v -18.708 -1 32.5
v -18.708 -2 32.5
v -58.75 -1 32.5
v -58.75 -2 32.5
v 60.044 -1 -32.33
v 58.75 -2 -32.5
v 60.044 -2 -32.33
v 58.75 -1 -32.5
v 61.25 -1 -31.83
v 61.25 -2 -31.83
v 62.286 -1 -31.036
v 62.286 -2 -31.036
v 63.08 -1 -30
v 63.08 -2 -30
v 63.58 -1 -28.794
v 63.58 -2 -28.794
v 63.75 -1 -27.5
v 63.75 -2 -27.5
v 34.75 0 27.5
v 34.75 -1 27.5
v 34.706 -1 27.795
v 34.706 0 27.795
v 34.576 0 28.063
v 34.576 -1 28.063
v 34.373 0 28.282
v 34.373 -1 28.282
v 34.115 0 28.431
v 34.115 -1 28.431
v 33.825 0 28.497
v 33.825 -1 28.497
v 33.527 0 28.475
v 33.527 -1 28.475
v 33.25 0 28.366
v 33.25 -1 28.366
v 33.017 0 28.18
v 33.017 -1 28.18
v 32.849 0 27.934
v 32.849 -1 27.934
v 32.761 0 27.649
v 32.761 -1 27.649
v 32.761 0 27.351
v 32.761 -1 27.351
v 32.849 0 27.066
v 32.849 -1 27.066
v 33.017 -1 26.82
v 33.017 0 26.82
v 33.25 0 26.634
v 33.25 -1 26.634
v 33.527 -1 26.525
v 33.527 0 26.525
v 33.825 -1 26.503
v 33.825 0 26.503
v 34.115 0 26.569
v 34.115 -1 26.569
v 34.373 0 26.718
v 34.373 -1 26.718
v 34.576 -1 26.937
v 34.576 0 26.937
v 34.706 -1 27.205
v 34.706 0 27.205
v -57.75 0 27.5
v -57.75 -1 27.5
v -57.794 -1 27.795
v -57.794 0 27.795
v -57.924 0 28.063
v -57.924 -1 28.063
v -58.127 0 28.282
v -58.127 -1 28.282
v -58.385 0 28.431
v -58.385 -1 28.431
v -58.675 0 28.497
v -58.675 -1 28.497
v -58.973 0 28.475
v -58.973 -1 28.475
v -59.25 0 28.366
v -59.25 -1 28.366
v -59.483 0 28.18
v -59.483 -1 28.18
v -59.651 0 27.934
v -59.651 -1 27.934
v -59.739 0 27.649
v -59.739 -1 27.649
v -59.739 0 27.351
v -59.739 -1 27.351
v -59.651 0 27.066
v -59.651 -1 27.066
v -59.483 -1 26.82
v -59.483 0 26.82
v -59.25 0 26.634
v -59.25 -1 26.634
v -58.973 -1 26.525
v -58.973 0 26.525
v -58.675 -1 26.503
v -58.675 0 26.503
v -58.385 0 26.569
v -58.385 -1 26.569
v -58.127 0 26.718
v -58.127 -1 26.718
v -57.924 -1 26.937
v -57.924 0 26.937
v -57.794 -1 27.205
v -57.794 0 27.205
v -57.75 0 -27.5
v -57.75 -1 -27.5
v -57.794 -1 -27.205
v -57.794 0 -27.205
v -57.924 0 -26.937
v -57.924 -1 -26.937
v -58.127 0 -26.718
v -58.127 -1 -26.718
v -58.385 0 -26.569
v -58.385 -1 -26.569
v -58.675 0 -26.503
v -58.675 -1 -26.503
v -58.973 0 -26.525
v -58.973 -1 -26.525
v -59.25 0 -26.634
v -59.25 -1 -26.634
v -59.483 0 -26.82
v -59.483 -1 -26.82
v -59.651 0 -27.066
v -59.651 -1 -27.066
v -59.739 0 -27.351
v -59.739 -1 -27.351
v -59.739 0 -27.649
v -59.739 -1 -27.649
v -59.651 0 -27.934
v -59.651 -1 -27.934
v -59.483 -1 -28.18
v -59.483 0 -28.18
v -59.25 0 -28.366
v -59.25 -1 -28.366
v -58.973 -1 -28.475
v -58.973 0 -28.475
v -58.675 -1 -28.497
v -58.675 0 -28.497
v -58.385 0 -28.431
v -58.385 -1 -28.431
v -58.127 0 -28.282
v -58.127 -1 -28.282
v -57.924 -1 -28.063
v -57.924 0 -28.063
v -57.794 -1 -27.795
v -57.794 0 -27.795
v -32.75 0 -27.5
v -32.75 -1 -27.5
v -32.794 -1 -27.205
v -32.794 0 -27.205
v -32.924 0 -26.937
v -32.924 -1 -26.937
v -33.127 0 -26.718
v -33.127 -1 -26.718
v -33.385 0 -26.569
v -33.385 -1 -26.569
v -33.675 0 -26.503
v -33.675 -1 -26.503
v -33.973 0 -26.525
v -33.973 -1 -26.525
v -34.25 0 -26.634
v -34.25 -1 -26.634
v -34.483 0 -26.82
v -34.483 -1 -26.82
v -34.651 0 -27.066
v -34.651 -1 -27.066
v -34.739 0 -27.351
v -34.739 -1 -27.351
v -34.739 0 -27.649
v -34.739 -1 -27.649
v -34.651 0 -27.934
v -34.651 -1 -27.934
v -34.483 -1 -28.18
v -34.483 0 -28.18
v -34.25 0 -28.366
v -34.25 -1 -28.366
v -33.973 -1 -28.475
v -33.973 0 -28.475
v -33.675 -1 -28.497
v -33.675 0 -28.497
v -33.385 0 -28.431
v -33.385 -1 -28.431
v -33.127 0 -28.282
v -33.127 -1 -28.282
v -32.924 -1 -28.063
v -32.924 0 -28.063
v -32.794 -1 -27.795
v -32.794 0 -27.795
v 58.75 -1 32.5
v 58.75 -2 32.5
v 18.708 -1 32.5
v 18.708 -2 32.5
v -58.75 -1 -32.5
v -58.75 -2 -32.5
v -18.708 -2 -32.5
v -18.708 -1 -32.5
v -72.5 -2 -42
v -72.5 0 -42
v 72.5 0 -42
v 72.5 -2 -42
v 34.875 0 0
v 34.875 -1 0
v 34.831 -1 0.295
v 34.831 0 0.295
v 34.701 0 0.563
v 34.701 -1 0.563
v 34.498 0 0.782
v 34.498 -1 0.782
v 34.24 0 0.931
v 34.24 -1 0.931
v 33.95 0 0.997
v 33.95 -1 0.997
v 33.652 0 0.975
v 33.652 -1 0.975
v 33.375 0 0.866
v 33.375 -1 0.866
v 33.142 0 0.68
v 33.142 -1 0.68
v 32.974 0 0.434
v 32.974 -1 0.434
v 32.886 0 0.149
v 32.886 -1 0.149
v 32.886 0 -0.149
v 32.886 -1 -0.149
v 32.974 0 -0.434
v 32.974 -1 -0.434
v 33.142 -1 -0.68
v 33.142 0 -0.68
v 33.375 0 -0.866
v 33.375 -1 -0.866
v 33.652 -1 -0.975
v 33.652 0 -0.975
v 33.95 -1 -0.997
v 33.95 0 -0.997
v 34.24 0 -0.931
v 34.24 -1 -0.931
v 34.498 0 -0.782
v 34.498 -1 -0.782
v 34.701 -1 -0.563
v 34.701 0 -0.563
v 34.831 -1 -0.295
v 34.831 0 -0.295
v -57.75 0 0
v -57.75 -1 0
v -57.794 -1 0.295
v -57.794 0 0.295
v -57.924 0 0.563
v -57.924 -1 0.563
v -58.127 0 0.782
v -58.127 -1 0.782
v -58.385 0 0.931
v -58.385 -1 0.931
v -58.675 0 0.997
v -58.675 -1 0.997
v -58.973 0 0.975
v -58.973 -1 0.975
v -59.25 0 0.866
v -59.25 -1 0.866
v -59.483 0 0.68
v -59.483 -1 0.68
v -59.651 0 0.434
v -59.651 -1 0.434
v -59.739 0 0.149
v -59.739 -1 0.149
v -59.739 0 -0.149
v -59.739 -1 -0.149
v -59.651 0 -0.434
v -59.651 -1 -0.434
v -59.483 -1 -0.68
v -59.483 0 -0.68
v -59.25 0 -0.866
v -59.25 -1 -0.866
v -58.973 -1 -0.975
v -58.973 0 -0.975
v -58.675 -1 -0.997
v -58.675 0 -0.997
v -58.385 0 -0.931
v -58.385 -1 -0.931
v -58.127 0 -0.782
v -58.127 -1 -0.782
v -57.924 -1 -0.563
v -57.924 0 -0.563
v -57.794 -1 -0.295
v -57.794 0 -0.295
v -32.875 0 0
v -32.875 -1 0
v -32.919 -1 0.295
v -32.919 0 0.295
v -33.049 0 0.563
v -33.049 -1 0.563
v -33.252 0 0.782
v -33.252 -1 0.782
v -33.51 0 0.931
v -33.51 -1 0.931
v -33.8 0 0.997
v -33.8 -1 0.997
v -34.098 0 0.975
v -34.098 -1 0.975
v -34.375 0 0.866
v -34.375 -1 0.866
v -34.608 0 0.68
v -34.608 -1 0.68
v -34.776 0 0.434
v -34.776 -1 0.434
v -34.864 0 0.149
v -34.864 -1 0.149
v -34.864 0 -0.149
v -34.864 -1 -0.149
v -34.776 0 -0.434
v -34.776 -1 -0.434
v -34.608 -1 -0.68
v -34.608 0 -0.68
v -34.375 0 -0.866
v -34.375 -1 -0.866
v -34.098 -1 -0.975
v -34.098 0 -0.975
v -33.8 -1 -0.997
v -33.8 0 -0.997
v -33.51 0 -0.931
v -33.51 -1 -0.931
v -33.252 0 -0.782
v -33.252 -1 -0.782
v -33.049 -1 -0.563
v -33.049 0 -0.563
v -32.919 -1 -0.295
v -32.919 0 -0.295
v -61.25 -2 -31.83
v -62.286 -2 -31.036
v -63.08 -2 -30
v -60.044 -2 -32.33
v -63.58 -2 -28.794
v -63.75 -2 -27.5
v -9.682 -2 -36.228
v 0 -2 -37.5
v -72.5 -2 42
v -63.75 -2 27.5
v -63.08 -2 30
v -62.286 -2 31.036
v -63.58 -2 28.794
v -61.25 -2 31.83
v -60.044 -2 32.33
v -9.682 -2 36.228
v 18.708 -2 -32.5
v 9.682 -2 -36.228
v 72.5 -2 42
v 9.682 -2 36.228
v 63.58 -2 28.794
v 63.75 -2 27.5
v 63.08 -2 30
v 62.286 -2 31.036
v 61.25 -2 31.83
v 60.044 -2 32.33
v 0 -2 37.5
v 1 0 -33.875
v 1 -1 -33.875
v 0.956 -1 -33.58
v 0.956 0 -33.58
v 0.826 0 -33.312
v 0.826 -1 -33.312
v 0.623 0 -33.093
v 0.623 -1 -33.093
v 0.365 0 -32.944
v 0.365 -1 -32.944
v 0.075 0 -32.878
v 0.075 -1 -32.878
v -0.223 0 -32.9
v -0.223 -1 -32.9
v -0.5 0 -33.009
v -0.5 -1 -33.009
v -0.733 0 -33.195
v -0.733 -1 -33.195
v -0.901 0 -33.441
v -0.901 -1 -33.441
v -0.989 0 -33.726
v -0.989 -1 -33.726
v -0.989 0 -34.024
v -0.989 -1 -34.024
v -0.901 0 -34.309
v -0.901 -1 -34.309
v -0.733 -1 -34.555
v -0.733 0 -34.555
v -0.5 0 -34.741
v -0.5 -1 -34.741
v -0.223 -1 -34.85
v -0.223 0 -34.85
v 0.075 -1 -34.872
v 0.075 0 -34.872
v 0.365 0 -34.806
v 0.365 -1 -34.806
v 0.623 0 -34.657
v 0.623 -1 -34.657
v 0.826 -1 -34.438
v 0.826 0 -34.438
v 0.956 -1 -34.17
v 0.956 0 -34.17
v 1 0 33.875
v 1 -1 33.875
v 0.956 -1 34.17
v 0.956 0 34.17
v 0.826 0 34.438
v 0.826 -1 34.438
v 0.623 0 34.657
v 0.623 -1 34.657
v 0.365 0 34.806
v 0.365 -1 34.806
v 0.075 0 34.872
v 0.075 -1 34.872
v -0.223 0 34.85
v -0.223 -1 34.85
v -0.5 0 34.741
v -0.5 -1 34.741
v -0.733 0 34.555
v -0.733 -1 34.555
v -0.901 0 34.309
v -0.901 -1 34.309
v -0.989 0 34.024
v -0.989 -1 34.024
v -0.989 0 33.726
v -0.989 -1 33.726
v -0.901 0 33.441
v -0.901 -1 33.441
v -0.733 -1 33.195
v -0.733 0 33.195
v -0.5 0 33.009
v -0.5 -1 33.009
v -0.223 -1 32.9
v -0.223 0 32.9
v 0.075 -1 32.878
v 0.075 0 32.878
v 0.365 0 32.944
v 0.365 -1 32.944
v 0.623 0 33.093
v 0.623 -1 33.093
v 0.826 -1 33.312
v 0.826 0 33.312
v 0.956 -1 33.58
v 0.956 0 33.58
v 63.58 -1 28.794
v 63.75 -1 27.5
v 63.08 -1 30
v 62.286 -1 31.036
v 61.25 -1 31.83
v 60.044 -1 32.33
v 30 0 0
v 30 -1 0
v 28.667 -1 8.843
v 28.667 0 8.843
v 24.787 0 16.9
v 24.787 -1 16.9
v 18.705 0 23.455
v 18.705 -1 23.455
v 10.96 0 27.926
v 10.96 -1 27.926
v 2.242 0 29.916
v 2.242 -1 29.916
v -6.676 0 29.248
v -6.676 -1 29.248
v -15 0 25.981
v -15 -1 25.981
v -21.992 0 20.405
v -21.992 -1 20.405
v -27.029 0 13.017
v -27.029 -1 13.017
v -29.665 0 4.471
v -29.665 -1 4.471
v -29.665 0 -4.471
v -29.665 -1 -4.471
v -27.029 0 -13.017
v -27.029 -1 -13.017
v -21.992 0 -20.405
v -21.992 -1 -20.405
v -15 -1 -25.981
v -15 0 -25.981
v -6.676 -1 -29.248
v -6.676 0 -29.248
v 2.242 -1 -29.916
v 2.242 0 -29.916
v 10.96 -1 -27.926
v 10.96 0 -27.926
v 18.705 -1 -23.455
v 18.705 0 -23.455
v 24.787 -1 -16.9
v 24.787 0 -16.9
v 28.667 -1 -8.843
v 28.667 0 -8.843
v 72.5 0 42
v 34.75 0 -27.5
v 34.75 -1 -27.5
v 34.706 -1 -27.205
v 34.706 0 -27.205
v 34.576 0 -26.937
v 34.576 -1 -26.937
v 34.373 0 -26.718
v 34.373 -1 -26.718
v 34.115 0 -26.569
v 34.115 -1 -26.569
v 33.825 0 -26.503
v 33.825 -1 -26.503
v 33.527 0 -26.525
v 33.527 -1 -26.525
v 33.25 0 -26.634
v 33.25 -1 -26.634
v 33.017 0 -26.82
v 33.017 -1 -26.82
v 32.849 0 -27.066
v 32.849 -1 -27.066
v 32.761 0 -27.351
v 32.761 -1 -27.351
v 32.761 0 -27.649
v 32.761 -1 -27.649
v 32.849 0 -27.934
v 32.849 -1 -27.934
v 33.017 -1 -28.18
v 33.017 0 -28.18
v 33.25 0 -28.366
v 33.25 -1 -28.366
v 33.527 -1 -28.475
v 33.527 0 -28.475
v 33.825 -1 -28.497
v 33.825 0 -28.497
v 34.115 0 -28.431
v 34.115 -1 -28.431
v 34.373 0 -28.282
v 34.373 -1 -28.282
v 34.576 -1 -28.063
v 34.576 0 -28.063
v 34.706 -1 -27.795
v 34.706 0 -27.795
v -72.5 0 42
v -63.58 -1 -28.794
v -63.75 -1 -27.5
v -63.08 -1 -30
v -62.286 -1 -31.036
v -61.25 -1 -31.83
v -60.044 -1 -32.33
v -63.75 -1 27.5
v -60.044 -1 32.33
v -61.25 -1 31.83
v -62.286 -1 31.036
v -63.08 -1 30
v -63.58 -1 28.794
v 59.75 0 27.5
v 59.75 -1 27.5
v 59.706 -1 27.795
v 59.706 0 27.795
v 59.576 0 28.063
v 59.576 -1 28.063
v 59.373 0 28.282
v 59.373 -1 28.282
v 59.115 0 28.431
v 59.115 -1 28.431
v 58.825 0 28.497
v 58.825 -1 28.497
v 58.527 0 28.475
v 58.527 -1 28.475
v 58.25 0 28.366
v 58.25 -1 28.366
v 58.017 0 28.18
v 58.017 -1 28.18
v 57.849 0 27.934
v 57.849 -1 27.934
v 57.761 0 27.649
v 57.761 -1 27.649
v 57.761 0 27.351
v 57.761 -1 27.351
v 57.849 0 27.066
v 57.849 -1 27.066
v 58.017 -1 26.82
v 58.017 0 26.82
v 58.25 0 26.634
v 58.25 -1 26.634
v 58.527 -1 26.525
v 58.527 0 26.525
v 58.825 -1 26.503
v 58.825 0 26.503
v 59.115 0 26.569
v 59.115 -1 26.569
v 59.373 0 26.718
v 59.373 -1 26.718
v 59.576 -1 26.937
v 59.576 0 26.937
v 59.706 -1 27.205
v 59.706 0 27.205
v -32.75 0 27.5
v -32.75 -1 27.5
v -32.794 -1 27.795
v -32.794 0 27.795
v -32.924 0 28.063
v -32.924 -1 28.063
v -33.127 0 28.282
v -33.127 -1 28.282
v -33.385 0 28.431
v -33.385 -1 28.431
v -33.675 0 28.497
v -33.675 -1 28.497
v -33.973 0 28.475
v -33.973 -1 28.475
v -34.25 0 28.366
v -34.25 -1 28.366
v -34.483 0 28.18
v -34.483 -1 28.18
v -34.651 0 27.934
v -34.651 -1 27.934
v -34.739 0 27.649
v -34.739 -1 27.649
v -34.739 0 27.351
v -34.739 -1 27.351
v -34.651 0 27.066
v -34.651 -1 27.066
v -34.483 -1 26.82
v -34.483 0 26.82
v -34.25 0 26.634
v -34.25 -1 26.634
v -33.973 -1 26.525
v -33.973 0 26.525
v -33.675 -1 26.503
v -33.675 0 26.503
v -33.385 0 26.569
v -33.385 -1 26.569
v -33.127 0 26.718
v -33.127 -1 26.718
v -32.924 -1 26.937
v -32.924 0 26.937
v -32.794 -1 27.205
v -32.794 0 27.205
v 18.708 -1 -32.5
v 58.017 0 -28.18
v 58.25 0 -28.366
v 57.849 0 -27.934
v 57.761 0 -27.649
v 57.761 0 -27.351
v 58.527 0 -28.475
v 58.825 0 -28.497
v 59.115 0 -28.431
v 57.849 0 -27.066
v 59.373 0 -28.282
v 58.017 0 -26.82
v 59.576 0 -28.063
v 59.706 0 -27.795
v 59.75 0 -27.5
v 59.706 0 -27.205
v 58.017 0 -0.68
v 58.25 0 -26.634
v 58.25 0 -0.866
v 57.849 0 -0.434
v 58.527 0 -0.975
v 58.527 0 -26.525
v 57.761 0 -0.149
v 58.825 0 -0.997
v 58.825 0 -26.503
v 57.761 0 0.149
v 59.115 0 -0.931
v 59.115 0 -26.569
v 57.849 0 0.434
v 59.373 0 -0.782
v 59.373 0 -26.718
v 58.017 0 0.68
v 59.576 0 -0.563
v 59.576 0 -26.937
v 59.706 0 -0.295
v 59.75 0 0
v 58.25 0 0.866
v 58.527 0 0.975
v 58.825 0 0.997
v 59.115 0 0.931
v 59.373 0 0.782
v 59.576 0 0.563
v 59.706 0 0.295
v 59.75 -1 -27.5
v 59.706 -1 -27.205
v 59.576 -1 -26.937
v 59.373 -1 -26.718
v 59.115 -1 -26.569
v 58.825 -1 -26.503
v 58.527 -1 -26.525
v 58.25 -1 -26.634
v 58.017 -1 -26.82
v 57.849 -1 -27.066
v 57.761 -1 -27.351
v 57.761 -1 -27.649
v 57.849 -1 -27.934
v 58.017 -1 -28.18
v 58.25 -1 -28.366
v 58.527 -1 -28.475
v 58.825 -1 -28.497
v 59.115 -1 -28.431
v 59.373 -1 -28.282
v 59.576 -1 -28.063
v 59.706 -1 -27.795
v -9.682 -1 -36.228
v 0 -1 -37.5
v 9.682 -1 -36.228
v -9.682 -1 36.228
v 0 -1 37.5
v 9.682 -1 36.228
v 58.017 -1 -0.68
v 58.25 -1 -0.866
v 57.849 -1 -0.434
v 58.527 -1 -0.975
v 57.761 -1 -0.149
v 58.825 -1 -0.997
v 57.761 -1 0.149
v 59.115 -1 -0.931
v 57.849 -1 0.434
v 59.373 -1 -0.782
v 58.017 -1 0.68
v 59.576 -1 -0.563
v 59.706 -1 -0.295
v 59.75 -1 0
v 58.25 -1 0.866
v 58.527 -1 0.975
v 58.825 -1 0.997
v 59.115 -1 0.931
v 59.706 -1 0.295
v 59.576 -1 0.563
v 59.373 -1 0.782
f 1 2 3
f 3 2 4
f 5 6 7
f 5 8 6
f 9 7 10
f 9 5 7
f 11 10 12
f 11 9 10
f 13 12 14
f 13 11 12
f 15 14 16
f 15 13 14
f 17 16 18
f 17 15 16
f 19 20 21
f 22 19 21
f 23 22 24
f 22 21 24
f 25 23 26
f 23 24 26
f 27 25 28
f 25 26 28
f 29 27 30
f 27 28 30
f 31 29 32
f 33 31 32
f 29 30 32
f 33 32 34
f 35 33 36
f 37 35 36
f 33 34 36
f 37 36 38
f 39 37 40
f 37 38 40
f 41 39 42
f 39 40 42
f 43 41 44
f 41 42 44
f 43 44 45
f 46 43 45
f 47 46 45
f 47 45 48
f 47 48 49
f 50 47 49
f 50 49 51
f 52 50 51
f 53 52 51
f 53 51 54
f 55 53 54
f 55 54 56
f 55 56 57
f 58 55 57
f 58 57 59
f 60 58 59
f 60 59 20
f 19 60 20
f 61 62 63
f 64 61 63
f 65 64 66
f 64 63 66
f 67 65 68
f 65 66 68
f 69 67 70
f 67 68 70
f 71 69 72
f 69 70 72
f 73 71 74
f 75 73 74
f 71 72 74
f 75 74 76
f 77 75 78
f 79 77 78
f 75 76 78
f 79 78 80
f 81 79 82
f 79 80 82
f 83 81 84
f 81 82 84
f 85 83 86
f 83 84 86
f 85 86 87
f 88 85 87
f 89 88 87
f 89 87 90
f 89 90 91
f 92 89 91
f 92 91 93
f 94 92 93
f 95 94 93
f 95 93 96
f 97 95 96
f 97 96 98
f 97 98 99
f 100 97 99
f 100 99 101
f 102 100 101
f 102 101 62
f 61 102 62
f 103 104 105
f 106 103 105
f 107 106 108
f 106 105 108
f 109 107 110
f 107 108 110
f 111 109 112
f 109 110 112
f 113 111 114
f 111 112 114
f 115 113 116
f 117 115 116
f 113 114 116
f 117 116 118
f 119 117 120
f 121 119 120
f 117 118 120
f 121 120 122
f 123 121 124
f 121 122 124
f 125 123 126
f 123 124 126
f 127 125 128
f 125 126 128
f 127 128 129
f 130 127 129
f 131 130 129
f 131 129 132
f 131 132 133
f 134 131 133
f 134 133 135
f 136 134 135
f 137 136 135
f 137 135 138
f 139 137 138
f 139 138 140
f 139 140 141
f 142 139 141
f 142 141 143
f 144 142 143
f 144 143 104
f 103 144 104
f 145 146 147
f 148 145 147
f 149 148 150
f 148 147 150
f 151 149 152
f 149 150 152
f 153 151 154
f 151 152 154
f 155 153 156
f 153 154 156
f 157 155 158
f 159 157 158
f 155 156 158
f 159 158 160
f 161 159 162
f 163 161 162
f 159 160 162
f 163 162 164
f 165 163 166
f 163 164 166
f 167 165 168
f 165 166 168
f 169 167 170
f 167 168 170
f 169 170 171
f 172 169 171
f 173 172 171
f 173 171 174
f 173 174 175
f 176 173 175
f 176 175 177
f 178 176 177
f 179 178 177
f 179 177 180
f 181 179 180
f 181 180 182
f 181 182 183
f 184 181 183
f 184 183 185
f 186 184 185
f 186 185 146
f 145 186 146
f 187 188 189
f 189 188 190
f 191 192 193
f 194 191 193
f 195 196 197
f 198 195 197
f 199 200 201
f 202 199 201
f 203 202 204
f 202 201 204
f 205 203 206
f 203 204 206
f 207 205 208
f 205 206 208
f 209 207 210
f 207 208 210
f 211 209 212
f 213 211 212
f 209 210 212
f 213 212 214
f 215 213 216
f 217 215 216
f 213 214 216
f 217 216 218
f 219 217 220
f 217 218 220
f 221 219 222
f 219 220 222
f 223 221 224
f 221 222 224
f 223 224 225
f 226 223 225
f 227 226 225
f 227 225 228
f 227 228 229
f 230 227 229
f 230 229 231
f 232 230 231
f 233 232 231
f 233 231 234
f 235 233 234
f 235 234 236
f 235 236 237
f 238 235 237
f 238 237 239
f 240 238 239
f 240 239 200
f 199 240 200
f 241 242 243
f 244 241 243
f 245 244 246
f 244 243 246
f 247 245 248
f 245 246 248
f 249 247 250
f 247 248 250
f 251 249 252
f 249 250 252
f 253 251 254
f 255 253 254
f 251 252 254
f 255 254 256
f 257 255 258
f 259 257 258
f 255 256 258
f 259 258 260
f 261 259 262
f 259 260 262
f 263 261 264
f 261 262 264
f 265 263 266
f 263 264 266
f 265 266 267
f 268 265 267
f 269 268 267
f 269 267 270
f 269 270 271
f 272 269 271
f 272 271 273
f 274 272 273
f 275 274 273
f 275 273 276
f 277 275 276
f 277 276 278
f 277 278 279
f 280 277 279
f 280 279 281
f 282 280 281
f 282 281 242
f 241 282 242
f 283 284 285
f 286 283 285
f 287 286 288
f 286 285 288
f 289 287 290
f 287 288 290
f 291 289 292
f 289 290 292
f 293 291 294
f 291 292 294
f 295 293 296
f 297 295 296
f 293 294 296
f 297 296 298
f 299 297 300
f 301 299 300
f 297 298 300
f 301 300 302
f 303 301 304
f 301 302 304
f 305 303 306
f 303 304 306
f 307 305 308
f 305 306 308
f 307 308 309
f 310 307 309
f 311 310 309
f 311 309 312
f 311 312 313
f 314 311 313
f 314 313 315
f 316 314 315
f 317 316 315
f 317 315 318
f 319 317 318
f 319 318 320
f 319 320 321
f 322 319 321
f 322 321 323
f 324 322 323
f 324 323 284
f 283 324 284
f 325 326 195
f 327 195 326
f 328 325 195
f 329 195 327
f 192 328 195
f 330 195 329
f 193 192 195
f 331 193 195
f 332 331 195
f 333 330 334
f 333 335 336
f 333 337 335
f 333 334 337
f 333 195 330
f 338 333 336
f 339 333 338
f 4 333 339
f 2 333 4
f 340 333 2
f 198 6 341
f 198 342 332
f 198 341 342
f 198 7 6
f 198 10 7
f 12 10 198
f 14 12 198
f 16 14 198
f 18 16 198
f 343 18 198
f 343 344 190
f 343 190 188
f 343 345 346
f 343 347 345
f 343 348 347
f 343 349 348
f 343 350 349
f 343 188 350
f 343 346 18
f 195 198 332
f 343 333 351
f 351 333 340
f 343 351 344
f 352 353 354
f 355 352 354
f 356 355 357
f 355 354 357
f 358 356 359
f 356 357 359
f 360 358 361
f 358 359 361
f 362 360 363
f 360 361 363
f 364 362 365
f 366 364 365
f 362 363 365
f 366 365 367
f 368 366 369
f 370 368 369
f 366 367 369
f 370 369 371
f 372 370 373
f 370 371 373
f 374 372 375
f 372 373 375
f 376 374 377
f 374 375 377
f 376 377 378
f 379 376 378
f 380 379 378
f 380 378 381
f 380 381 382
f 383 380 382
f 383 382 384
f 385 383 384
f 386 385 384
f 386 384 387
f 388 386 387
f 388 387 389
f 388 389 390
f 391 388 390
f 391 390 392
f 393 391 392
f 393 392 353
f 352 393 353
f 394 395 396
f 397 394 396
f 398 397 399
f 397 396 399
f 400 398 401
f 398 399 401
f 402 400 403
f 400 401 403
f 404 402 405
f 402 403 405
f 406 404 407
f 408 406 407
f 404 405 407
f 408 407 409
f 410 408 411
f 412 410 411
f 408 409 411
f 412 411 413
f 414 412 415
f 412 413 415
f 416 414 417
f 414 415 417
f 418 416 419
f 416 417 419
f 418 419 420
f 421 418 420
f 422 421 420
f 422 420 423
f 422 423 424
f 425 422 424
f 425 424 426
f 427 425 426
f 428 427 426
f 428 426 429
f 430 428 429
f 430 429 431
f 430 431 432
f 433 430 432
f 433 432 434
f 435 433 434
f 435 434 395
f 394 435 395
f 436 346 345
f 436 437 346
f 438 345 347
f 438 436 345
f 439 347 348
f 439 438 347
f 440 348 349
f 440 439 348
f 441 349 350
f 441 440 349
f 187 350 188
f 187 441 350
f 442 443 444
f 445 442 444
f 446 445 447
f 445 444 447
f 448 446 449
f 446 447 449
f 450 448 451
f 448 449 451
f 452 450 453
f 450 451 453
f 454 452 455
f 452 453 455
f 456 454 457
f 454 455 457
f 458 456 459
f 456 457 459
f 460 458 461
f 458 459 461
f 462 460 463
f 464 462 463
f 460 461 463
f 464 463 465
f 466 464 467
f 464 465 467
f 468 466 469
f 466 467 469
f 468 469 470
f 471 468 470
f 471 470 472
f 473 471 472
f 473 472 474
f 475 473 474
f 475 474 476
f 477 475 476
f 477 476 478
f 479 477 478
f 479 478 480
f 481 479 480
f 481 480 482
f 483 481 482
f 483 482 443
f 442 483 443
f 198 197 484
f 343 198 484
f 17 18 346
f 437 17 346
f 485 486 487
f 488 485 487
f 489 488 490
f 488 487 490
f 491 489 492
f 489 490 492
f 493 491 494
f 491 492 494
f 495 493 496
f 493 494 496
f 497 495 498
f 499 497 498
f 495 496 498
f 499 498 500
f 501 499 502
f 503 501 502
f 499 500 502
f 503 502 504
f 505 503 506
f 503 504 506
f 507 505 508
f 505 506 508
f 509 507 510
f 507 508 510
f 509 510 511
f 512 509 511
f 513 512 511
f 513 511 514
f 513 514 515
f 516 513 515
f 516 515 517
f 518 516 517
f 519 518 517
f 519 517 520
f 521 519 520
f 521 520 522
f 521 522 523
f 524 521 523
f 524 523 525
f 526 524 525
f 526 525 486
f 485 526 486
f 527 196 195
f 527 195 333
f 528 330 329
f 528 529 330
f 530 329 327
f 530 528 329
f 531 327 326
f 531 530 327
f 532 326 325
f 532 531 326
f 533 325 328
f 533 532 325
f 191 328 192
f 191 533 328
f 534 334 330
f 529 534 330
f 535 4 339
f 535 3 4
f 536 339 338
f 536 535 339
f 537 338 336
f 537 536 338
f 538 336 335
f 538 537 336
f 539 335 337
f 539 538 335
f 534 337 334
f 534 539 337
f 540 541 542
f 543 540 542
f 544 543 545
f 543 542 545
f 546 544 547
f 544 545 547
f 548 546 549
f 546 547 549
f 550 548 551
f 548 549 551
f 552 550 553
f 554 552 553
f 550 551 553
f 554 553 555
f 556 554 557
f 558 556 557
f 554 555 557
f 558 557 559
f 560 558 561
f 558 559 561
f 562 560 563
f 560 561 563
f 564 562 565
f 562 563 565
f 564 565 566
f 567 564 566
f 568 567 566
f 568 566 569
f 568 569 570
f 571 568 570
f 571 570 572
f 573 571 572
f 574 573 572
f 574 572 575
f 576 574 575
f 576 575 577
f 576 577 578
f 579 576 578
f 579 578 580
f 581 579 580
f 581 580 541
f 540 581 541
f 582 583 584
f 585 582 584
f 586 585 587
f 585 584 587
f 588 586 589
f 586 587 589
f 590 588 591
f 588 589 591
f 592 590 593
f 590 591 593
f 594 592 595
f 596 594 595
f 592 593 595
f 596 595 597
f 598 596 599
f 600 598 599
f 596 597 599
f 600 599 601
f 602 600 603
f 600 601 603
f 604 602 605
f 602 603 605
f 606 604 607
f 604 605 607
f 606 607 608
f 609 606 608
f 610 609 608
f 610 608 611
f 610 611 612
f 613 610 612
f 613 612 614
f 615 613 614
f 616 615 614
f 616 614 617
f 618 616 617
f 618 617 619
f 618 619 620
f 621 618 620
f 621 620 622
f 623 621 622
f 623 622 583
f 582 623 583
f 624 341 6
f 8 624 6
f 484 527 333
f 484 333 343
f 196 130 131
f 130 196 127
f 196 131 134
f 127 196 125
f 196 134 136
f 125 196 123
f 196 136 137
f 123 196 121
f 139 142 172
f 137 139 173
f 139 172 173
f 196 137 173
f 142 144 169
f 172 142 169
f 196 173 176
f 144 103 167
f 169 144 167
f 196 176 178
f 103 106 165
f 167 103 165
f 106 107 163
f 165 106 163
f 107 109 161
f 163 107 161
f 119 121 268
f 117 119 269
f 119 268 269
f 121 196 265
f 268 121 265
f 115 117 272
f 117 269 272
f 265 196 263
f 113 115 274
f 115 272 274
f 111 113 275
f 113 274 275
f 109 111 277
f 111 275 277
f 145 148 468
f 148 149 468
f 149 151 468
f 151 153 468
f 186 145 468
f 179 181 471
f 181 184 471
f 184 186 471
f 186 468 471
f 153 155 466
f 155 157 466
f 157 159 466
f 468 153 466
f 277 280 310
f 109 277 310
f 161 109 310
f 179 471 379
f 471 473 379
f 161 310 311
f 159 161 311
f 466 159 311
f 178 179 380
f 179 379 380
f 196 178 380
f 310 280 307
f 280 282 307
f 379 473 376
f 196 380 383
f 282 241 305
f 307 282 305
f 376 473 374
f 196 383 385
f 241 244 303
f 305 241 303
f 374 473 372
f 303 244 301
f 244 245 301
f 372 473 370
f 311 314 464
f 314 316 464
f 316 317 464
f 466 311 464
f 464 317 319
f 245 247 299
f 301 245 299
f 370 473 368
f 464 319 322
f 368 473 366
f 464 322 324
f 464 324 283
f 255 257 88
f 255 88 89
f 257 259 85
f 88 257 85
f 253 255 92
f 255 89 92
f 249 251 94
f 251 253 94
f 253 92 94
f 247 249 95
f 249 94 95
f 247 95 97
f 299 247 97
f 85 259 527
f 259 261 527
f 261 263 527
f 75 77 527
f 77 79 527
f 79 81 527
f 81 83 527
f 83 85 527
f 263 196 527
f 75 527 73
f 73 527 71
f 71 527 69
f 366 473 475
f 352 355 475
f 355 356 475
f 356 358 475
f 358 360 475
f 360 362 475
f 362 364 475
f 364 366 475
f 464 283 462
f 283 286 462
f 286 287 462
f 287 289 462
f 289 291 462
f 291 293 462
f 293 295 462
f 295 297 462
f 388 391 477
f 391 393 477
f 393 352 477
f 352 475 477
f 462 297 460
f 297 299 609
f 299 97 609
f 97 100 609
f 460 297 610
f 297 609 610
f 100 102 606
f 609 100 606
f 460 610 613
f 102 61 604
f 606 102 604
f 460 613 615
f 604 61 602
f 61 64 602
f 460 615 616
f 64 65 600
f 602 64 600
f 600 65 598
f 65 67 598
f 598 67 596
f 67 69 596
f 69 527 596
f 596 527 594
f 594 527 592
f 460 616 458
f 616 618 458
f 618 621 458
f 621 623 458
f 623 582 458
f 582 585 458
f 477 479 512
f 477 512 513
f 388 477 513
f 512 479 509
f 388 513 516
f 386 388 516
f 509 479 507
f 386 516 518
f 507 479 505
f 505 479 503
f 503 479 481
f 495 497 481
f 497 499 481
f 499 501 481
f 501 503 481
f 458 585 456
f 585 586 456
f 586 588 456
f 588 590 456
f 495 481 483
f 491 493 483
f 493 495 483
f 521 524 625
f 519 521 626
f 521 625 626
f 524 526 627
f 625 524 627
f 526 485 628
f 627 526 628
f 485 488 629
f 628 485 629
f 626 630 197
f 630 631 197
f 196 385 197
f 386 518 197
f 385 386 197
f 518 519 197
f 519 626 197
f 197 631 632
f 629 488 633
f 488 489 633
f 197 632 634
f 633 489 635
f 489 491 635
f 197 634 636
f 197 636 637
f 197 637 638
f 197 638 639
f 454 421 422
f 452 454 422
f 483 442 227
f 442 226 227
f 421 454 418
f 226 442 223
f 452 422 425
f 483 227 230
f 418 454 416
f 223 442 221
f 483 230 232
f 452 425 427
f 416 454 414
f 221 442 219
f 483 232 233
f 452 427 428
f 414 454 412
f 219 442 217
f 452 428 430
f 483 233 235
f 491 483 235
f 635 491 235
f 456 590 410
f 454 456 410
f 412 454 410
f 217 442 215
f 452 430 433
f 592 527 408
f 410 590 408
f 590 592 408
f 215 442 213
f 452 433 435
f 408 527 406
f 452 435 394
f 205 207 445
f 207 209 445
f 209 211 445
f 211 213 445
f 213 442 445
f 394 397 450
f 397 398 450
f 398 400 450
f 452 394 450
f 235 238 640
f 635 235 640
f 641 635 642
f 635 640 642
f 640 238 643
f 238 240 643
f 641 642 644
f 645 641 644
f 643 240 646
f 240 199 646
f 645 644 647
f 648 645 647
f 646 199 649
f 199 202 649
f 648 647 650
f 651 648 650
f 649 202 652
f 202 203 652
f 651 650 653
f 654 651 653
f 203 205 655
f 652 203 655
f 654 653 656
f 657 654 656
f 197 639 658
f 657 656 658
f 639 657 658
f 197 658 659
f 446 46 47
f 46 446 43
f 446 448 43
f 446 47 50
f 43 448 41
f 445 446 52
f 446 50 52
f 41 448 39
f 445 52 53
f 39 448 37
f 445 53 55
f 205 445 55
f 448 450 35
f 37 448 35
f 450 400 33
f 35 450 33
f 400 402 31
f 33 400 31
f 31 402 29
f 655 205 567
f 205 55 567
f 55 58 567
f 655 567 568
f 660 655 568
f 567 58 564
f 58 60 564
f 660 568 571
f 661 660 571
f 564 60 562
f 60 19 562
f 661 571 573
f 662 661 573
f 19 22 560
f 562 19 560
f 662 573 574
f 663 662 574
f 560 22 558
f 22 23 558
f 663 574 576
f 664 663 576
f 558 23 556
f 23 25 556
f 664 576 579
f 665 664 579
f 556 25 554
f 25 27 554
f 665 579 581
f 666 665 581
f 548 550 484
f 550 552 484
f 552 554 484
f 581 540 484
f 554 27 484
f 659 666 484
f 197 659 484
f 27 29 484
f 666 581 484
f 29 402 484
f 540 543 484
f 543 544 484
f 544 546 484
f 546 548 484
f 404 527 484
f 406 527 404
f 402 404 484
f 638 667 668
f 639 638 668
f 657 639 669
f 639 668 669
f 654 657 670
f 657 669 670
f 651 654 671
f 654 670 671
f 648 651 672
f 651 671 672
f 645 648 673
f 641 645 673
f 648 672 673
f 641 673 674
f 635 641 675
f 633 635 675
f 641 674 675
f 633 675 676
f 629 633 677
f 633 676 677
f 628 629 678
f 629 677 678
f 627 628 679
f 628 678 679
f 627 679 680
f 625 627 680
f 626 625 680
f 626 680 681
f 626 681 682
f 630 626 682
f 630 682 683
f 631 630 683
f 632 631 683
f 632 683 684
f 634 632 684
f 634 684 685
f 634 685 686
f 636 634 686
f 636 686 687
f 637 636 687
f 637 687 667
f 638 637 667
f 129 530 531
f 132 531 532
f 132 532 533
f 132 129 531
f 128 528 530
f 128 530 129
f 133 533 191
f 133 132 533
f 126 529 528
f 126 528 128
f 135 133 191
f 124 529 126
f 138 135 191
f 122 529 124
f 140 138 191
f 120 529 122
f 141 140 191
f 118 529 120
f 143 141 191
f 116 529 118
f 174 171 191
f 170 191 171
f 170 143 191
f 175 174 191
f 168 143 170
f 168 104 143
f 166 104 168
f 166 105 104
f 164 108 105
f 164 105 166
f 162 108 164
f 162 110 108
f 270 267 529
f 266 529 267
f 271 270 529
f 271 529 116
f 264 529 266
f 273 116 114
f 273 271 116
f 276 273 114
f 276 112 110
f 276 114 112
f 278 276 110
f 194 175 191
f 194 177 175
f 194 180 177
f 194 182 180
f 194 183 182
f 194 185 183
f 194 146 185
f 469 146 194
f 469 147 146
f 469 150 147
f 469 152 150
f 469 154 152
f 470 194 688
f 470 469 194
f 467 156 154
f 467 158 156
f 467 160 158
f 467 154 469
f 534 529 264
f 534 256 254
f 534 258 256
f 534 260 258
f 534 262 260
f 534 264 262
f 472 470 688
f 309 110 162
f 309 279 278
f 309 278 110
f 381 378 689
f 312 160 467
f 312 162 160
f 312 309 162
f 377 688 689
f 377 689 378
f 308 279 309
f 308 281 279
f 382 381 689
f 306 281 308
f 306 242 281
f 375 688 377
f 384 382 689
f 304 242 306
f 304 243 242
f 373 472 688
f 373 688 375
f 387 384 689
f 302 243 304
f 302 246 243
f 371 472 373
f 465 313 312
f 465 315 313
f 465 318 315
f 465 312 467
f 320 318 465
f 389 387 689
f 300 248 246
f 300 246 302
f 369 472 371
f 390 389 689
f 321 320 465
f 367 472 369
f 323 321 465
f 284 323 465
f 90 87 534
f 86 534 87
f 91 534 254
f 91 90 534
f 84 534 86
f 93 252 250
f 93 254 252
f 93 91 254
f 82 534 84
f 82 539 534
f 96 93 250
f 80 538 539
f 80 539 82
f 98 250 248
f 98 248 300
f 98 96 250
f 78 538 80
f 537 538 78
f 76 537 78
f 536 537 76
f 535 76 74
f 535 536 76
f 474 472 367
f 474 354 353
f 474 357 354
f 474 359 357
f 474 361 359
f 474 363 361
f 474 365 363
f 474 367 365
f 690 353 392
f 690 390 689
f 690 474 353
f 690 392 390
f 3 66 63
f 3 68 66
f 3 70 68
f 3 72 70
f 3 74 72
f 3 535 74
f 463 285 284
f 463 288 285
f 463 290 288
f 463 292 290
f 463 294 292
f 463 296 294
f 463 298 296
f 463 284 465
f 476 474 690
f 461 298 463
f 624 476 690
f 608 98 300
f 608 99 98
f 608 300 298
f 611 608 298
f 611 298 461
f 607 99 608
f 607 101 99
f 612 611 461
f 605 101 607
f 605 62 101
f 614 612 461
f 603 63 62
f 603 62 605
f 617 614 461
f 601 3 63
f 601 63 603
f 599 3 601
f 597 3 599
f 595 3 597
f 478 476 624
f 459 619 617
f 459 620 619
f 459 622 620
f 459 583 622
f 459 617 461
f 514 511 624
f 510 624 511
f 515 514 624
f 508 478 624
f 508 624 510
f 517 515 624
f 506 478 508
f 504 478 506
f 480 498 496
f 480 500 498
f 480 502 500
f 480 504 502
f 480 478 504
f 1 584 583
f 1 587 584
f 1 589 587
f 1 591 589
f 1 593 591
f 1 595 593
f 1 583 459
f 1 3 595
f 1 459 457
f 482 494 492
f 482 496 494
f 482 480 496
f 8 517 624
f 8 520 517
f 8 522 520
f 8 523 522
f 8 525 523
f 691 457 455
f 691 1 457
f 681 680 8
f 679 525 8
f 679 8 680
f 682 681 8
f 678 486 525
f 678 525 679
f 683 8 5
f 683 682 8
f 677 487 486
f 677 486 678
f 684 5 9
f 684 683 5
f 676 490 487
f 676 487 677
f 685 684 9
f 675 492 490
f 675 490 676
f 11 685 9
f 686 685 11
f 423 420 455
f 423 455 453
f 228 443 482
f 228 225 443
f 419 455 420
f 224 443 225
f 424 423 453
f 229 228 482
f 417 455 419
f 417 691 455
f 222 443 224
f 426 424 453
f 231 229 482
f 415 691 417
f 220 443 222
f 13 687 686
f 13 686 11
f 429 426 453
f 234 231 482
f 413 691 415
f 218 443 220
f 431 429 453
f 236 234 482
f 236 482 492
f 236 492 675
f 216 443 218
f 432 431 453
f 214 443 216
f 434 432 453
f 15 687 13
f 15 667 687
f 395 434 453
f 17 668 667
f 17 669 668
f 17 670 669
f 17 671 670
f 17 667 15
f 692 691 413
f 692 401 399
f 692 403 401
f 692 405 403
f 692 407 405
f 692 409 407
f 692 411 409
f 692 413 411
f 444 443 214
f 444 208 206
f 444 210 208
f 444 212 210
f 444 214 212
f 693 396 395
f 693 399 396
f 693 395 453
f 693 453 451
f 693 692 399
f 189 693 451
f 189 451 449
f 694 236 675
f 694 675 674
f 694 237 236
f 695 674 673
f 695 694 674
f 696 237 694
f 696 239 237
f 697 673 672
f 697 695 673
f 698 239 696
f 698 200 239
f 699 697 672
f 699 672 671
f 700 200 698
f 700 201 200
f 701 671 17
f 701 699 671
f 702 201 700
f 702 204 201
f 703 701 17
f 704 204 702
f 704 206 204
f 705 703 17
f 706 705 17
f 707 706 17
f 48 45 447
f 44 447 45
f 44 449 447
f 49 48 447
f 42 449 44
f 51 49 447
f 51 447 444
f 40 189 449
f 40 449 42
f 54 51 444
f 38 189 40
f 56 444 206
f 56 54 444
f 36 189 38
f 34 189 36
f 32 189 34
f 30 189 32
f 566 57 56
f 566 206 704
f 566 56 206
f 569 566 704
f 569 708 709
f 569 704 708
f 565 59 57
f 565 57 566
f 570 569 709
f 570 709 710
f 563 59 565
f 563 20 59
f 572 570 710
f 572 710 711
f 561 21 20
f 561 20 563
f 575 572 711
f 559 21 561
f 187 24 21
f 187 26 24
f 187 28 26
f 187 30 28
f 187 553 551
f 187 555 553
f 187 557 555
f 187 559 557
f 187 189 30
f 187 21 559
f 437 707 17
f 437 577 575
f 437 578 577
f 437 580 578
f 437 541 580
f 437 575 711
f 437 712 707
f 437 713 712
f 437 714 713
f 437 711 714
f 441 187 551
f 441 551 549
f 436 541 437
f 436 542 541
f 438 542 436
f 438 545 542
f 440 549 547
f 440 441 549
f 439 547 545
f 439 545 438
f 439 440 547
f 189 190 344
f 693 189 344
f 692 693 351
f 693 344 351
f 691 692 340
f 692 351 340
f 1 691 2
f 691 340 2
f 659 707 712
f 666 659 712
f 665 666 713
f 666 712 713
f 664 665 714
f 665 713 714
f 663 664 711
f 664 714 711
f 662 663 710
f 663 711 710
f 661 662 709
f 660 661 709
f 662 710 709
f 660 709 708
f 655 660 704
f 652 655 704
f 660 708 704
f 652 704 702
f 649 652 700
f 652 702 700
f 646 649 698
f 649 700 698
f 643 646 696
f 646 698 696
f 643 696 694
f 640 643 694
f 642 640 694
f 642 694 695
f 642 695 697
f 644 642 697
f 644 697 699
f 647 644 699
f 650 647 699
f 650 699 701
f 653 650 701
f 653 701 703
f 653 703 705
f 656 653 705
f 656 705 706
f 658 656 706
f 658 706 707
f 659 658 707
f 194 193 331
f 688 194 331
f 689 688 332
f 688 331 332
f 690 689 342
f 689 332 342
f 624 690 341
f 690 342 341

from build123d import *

# Parameters (mm, degrees)
F0_W     = 145
F0_H     = 84
F1_DEPTH = 2
F3_DEPTH = 1
F4_R     = 30
F5_DEPTH = 25
F6_R     = 1
F7_DEPTH = 25
F8_R     = 1
F9_DEPTH = 25
F10_R    = 5


with BuildPart() as f1:
    # F0 (on Front) → F1 (new body)
    with BuildSketch(Plane.XZ):
        Rectangle(F0_W, F0_H)
    extrude(amount=F1_DEPTH)

    # F2 (on face) → F3 (cut)
    with BuildSketch(Plane.XZ.offset(2)):
        with BuildLine():
            ThreePointArc((18.7082869339, -32.5), (32.4639088837, -18.7708449461), (37.5, 0))
            ThreePointArc((37.5, 0), (32.4639088837, 18.7708449461), (18.7082869339, 32.5))
            Line((18.7082869339, 32.5), (-18.7082869339, 32.5))
            ThreePointArc((-18.7082869339, 32.5), (-37.5, 0), (-18.7082869339, -32.5))
            Line((-18.7082869339, -32.5), (18.7082869339, -32.5))
        make_face()
        with BuildLine():
            ThreePointArc((18.7082869339, 32.5), (32.4639088837, 18.7708449461), (37.5, 0))
            ThreePointArc((37.5, 0), (32.4639088837, -18.7708449461), (18.7082869339, -32.5))
            Line((18.7082869339, -32.5), (63.75, -32.5))
            Line((63.75, -32.5), (63.75, 32.5))
            Line((63.75, 32.5), (18.7082869339, 32.5))
        make_face()
        with BuildLine():
            Line((-18.7082869339, 32.5), (18.7082869339, 32.5))
            ThreePointArc((18.7082869339, 32.5), (0, 37.5), (-18.7082869339, 32.5))
        make_face()
        with BuildLine():
            ThreePointArc((-18.7082869339, -32.5), (0, -37.5), (18.7082869339, -32.5))
            Line((18.7082869339, -32.5), (-18.7082869339, -32.5))
        make_face()
        with BuildLine():
            ThreePointArc((-18.7082869339, -32.5), (-37.5, 0), (-18.7082869339, 32.5))
            Line((-18.7082869339, 32.5), (-63.75, 32.5))
            Line((-63.75, 32.5), (-63.75, -32.5))
            Line((-63.75, -32.5), (-18.7082869339, -32.5))
        make_face()
    extrude(amount=-F3_DEPTH, mode=Mode.SUBTRACT)

    # F4 (on face) → F5 (cut)
    with BuildSketch(Plane.XZ.offset(1)):
        Circle(F4_R)
    extrude(amount=-F5_DEPTH, mode=Mode.SUBTRACT)

    # F6 (on face) → F7 (cut)
    with BuildSketch(Plane.XZ.offset(1)):
        with Locations((-58.75, 27.5)):
            Circle(F6_R)
        with Locations((-58.75, -27.5)):
            Circle(F6_R)
        with Locations((58.75, -27.5)):
            Circle(F6_R)
        with Locations((58.75, 27.5)):
            Circle(F6_R)
        with Locations((-58.75, 0)):
            Circle(F6_R)
        with Locations((58.75, 0)):
            Circle(F6_R)
        with Locations((-33.75, 27.5)):
            Circle(F6_R)
        with Locations((33.75, 27.5)):
            Circle(F6_R)
        with Locations((33.75, -27.5)):
            Circle(F6_R)
        with Locations((-33.75, -27.5)):
            Circle(F6_R)
    extrude(amount=-F7_DEPTH, mode=Mode.SUBTRACT)

    # F8 (on face) → F9 (cut)
    with BuildSketch(Plane.XZ.offset(1)):
        with Locations((0, 33.875)):
            Circle(F8_R)
        with Locations((33.875, 0)):
            Circle(F8_R)
        with Locations((-33.875, 0)):
            Circle(F8_R)
        with Locations((0, -33.875)):
            Circle(F8_R)
    extrude(amount=-F9_DEPTH, mode=Mode.SUBTRACT)

    # F10
    f10_edges = [f1.edges().sort_by_distance(p)[0] for p in [
        (-63.75, -1.5, 32.5),
        (-63.75, -1.5, -32.5),
        (63.75, -1.5, 32.5),
        (63.75, -1.5, -32.5),
    ]]
    fillet(f10_edges, radius=F10_R)


solid = f1.part
